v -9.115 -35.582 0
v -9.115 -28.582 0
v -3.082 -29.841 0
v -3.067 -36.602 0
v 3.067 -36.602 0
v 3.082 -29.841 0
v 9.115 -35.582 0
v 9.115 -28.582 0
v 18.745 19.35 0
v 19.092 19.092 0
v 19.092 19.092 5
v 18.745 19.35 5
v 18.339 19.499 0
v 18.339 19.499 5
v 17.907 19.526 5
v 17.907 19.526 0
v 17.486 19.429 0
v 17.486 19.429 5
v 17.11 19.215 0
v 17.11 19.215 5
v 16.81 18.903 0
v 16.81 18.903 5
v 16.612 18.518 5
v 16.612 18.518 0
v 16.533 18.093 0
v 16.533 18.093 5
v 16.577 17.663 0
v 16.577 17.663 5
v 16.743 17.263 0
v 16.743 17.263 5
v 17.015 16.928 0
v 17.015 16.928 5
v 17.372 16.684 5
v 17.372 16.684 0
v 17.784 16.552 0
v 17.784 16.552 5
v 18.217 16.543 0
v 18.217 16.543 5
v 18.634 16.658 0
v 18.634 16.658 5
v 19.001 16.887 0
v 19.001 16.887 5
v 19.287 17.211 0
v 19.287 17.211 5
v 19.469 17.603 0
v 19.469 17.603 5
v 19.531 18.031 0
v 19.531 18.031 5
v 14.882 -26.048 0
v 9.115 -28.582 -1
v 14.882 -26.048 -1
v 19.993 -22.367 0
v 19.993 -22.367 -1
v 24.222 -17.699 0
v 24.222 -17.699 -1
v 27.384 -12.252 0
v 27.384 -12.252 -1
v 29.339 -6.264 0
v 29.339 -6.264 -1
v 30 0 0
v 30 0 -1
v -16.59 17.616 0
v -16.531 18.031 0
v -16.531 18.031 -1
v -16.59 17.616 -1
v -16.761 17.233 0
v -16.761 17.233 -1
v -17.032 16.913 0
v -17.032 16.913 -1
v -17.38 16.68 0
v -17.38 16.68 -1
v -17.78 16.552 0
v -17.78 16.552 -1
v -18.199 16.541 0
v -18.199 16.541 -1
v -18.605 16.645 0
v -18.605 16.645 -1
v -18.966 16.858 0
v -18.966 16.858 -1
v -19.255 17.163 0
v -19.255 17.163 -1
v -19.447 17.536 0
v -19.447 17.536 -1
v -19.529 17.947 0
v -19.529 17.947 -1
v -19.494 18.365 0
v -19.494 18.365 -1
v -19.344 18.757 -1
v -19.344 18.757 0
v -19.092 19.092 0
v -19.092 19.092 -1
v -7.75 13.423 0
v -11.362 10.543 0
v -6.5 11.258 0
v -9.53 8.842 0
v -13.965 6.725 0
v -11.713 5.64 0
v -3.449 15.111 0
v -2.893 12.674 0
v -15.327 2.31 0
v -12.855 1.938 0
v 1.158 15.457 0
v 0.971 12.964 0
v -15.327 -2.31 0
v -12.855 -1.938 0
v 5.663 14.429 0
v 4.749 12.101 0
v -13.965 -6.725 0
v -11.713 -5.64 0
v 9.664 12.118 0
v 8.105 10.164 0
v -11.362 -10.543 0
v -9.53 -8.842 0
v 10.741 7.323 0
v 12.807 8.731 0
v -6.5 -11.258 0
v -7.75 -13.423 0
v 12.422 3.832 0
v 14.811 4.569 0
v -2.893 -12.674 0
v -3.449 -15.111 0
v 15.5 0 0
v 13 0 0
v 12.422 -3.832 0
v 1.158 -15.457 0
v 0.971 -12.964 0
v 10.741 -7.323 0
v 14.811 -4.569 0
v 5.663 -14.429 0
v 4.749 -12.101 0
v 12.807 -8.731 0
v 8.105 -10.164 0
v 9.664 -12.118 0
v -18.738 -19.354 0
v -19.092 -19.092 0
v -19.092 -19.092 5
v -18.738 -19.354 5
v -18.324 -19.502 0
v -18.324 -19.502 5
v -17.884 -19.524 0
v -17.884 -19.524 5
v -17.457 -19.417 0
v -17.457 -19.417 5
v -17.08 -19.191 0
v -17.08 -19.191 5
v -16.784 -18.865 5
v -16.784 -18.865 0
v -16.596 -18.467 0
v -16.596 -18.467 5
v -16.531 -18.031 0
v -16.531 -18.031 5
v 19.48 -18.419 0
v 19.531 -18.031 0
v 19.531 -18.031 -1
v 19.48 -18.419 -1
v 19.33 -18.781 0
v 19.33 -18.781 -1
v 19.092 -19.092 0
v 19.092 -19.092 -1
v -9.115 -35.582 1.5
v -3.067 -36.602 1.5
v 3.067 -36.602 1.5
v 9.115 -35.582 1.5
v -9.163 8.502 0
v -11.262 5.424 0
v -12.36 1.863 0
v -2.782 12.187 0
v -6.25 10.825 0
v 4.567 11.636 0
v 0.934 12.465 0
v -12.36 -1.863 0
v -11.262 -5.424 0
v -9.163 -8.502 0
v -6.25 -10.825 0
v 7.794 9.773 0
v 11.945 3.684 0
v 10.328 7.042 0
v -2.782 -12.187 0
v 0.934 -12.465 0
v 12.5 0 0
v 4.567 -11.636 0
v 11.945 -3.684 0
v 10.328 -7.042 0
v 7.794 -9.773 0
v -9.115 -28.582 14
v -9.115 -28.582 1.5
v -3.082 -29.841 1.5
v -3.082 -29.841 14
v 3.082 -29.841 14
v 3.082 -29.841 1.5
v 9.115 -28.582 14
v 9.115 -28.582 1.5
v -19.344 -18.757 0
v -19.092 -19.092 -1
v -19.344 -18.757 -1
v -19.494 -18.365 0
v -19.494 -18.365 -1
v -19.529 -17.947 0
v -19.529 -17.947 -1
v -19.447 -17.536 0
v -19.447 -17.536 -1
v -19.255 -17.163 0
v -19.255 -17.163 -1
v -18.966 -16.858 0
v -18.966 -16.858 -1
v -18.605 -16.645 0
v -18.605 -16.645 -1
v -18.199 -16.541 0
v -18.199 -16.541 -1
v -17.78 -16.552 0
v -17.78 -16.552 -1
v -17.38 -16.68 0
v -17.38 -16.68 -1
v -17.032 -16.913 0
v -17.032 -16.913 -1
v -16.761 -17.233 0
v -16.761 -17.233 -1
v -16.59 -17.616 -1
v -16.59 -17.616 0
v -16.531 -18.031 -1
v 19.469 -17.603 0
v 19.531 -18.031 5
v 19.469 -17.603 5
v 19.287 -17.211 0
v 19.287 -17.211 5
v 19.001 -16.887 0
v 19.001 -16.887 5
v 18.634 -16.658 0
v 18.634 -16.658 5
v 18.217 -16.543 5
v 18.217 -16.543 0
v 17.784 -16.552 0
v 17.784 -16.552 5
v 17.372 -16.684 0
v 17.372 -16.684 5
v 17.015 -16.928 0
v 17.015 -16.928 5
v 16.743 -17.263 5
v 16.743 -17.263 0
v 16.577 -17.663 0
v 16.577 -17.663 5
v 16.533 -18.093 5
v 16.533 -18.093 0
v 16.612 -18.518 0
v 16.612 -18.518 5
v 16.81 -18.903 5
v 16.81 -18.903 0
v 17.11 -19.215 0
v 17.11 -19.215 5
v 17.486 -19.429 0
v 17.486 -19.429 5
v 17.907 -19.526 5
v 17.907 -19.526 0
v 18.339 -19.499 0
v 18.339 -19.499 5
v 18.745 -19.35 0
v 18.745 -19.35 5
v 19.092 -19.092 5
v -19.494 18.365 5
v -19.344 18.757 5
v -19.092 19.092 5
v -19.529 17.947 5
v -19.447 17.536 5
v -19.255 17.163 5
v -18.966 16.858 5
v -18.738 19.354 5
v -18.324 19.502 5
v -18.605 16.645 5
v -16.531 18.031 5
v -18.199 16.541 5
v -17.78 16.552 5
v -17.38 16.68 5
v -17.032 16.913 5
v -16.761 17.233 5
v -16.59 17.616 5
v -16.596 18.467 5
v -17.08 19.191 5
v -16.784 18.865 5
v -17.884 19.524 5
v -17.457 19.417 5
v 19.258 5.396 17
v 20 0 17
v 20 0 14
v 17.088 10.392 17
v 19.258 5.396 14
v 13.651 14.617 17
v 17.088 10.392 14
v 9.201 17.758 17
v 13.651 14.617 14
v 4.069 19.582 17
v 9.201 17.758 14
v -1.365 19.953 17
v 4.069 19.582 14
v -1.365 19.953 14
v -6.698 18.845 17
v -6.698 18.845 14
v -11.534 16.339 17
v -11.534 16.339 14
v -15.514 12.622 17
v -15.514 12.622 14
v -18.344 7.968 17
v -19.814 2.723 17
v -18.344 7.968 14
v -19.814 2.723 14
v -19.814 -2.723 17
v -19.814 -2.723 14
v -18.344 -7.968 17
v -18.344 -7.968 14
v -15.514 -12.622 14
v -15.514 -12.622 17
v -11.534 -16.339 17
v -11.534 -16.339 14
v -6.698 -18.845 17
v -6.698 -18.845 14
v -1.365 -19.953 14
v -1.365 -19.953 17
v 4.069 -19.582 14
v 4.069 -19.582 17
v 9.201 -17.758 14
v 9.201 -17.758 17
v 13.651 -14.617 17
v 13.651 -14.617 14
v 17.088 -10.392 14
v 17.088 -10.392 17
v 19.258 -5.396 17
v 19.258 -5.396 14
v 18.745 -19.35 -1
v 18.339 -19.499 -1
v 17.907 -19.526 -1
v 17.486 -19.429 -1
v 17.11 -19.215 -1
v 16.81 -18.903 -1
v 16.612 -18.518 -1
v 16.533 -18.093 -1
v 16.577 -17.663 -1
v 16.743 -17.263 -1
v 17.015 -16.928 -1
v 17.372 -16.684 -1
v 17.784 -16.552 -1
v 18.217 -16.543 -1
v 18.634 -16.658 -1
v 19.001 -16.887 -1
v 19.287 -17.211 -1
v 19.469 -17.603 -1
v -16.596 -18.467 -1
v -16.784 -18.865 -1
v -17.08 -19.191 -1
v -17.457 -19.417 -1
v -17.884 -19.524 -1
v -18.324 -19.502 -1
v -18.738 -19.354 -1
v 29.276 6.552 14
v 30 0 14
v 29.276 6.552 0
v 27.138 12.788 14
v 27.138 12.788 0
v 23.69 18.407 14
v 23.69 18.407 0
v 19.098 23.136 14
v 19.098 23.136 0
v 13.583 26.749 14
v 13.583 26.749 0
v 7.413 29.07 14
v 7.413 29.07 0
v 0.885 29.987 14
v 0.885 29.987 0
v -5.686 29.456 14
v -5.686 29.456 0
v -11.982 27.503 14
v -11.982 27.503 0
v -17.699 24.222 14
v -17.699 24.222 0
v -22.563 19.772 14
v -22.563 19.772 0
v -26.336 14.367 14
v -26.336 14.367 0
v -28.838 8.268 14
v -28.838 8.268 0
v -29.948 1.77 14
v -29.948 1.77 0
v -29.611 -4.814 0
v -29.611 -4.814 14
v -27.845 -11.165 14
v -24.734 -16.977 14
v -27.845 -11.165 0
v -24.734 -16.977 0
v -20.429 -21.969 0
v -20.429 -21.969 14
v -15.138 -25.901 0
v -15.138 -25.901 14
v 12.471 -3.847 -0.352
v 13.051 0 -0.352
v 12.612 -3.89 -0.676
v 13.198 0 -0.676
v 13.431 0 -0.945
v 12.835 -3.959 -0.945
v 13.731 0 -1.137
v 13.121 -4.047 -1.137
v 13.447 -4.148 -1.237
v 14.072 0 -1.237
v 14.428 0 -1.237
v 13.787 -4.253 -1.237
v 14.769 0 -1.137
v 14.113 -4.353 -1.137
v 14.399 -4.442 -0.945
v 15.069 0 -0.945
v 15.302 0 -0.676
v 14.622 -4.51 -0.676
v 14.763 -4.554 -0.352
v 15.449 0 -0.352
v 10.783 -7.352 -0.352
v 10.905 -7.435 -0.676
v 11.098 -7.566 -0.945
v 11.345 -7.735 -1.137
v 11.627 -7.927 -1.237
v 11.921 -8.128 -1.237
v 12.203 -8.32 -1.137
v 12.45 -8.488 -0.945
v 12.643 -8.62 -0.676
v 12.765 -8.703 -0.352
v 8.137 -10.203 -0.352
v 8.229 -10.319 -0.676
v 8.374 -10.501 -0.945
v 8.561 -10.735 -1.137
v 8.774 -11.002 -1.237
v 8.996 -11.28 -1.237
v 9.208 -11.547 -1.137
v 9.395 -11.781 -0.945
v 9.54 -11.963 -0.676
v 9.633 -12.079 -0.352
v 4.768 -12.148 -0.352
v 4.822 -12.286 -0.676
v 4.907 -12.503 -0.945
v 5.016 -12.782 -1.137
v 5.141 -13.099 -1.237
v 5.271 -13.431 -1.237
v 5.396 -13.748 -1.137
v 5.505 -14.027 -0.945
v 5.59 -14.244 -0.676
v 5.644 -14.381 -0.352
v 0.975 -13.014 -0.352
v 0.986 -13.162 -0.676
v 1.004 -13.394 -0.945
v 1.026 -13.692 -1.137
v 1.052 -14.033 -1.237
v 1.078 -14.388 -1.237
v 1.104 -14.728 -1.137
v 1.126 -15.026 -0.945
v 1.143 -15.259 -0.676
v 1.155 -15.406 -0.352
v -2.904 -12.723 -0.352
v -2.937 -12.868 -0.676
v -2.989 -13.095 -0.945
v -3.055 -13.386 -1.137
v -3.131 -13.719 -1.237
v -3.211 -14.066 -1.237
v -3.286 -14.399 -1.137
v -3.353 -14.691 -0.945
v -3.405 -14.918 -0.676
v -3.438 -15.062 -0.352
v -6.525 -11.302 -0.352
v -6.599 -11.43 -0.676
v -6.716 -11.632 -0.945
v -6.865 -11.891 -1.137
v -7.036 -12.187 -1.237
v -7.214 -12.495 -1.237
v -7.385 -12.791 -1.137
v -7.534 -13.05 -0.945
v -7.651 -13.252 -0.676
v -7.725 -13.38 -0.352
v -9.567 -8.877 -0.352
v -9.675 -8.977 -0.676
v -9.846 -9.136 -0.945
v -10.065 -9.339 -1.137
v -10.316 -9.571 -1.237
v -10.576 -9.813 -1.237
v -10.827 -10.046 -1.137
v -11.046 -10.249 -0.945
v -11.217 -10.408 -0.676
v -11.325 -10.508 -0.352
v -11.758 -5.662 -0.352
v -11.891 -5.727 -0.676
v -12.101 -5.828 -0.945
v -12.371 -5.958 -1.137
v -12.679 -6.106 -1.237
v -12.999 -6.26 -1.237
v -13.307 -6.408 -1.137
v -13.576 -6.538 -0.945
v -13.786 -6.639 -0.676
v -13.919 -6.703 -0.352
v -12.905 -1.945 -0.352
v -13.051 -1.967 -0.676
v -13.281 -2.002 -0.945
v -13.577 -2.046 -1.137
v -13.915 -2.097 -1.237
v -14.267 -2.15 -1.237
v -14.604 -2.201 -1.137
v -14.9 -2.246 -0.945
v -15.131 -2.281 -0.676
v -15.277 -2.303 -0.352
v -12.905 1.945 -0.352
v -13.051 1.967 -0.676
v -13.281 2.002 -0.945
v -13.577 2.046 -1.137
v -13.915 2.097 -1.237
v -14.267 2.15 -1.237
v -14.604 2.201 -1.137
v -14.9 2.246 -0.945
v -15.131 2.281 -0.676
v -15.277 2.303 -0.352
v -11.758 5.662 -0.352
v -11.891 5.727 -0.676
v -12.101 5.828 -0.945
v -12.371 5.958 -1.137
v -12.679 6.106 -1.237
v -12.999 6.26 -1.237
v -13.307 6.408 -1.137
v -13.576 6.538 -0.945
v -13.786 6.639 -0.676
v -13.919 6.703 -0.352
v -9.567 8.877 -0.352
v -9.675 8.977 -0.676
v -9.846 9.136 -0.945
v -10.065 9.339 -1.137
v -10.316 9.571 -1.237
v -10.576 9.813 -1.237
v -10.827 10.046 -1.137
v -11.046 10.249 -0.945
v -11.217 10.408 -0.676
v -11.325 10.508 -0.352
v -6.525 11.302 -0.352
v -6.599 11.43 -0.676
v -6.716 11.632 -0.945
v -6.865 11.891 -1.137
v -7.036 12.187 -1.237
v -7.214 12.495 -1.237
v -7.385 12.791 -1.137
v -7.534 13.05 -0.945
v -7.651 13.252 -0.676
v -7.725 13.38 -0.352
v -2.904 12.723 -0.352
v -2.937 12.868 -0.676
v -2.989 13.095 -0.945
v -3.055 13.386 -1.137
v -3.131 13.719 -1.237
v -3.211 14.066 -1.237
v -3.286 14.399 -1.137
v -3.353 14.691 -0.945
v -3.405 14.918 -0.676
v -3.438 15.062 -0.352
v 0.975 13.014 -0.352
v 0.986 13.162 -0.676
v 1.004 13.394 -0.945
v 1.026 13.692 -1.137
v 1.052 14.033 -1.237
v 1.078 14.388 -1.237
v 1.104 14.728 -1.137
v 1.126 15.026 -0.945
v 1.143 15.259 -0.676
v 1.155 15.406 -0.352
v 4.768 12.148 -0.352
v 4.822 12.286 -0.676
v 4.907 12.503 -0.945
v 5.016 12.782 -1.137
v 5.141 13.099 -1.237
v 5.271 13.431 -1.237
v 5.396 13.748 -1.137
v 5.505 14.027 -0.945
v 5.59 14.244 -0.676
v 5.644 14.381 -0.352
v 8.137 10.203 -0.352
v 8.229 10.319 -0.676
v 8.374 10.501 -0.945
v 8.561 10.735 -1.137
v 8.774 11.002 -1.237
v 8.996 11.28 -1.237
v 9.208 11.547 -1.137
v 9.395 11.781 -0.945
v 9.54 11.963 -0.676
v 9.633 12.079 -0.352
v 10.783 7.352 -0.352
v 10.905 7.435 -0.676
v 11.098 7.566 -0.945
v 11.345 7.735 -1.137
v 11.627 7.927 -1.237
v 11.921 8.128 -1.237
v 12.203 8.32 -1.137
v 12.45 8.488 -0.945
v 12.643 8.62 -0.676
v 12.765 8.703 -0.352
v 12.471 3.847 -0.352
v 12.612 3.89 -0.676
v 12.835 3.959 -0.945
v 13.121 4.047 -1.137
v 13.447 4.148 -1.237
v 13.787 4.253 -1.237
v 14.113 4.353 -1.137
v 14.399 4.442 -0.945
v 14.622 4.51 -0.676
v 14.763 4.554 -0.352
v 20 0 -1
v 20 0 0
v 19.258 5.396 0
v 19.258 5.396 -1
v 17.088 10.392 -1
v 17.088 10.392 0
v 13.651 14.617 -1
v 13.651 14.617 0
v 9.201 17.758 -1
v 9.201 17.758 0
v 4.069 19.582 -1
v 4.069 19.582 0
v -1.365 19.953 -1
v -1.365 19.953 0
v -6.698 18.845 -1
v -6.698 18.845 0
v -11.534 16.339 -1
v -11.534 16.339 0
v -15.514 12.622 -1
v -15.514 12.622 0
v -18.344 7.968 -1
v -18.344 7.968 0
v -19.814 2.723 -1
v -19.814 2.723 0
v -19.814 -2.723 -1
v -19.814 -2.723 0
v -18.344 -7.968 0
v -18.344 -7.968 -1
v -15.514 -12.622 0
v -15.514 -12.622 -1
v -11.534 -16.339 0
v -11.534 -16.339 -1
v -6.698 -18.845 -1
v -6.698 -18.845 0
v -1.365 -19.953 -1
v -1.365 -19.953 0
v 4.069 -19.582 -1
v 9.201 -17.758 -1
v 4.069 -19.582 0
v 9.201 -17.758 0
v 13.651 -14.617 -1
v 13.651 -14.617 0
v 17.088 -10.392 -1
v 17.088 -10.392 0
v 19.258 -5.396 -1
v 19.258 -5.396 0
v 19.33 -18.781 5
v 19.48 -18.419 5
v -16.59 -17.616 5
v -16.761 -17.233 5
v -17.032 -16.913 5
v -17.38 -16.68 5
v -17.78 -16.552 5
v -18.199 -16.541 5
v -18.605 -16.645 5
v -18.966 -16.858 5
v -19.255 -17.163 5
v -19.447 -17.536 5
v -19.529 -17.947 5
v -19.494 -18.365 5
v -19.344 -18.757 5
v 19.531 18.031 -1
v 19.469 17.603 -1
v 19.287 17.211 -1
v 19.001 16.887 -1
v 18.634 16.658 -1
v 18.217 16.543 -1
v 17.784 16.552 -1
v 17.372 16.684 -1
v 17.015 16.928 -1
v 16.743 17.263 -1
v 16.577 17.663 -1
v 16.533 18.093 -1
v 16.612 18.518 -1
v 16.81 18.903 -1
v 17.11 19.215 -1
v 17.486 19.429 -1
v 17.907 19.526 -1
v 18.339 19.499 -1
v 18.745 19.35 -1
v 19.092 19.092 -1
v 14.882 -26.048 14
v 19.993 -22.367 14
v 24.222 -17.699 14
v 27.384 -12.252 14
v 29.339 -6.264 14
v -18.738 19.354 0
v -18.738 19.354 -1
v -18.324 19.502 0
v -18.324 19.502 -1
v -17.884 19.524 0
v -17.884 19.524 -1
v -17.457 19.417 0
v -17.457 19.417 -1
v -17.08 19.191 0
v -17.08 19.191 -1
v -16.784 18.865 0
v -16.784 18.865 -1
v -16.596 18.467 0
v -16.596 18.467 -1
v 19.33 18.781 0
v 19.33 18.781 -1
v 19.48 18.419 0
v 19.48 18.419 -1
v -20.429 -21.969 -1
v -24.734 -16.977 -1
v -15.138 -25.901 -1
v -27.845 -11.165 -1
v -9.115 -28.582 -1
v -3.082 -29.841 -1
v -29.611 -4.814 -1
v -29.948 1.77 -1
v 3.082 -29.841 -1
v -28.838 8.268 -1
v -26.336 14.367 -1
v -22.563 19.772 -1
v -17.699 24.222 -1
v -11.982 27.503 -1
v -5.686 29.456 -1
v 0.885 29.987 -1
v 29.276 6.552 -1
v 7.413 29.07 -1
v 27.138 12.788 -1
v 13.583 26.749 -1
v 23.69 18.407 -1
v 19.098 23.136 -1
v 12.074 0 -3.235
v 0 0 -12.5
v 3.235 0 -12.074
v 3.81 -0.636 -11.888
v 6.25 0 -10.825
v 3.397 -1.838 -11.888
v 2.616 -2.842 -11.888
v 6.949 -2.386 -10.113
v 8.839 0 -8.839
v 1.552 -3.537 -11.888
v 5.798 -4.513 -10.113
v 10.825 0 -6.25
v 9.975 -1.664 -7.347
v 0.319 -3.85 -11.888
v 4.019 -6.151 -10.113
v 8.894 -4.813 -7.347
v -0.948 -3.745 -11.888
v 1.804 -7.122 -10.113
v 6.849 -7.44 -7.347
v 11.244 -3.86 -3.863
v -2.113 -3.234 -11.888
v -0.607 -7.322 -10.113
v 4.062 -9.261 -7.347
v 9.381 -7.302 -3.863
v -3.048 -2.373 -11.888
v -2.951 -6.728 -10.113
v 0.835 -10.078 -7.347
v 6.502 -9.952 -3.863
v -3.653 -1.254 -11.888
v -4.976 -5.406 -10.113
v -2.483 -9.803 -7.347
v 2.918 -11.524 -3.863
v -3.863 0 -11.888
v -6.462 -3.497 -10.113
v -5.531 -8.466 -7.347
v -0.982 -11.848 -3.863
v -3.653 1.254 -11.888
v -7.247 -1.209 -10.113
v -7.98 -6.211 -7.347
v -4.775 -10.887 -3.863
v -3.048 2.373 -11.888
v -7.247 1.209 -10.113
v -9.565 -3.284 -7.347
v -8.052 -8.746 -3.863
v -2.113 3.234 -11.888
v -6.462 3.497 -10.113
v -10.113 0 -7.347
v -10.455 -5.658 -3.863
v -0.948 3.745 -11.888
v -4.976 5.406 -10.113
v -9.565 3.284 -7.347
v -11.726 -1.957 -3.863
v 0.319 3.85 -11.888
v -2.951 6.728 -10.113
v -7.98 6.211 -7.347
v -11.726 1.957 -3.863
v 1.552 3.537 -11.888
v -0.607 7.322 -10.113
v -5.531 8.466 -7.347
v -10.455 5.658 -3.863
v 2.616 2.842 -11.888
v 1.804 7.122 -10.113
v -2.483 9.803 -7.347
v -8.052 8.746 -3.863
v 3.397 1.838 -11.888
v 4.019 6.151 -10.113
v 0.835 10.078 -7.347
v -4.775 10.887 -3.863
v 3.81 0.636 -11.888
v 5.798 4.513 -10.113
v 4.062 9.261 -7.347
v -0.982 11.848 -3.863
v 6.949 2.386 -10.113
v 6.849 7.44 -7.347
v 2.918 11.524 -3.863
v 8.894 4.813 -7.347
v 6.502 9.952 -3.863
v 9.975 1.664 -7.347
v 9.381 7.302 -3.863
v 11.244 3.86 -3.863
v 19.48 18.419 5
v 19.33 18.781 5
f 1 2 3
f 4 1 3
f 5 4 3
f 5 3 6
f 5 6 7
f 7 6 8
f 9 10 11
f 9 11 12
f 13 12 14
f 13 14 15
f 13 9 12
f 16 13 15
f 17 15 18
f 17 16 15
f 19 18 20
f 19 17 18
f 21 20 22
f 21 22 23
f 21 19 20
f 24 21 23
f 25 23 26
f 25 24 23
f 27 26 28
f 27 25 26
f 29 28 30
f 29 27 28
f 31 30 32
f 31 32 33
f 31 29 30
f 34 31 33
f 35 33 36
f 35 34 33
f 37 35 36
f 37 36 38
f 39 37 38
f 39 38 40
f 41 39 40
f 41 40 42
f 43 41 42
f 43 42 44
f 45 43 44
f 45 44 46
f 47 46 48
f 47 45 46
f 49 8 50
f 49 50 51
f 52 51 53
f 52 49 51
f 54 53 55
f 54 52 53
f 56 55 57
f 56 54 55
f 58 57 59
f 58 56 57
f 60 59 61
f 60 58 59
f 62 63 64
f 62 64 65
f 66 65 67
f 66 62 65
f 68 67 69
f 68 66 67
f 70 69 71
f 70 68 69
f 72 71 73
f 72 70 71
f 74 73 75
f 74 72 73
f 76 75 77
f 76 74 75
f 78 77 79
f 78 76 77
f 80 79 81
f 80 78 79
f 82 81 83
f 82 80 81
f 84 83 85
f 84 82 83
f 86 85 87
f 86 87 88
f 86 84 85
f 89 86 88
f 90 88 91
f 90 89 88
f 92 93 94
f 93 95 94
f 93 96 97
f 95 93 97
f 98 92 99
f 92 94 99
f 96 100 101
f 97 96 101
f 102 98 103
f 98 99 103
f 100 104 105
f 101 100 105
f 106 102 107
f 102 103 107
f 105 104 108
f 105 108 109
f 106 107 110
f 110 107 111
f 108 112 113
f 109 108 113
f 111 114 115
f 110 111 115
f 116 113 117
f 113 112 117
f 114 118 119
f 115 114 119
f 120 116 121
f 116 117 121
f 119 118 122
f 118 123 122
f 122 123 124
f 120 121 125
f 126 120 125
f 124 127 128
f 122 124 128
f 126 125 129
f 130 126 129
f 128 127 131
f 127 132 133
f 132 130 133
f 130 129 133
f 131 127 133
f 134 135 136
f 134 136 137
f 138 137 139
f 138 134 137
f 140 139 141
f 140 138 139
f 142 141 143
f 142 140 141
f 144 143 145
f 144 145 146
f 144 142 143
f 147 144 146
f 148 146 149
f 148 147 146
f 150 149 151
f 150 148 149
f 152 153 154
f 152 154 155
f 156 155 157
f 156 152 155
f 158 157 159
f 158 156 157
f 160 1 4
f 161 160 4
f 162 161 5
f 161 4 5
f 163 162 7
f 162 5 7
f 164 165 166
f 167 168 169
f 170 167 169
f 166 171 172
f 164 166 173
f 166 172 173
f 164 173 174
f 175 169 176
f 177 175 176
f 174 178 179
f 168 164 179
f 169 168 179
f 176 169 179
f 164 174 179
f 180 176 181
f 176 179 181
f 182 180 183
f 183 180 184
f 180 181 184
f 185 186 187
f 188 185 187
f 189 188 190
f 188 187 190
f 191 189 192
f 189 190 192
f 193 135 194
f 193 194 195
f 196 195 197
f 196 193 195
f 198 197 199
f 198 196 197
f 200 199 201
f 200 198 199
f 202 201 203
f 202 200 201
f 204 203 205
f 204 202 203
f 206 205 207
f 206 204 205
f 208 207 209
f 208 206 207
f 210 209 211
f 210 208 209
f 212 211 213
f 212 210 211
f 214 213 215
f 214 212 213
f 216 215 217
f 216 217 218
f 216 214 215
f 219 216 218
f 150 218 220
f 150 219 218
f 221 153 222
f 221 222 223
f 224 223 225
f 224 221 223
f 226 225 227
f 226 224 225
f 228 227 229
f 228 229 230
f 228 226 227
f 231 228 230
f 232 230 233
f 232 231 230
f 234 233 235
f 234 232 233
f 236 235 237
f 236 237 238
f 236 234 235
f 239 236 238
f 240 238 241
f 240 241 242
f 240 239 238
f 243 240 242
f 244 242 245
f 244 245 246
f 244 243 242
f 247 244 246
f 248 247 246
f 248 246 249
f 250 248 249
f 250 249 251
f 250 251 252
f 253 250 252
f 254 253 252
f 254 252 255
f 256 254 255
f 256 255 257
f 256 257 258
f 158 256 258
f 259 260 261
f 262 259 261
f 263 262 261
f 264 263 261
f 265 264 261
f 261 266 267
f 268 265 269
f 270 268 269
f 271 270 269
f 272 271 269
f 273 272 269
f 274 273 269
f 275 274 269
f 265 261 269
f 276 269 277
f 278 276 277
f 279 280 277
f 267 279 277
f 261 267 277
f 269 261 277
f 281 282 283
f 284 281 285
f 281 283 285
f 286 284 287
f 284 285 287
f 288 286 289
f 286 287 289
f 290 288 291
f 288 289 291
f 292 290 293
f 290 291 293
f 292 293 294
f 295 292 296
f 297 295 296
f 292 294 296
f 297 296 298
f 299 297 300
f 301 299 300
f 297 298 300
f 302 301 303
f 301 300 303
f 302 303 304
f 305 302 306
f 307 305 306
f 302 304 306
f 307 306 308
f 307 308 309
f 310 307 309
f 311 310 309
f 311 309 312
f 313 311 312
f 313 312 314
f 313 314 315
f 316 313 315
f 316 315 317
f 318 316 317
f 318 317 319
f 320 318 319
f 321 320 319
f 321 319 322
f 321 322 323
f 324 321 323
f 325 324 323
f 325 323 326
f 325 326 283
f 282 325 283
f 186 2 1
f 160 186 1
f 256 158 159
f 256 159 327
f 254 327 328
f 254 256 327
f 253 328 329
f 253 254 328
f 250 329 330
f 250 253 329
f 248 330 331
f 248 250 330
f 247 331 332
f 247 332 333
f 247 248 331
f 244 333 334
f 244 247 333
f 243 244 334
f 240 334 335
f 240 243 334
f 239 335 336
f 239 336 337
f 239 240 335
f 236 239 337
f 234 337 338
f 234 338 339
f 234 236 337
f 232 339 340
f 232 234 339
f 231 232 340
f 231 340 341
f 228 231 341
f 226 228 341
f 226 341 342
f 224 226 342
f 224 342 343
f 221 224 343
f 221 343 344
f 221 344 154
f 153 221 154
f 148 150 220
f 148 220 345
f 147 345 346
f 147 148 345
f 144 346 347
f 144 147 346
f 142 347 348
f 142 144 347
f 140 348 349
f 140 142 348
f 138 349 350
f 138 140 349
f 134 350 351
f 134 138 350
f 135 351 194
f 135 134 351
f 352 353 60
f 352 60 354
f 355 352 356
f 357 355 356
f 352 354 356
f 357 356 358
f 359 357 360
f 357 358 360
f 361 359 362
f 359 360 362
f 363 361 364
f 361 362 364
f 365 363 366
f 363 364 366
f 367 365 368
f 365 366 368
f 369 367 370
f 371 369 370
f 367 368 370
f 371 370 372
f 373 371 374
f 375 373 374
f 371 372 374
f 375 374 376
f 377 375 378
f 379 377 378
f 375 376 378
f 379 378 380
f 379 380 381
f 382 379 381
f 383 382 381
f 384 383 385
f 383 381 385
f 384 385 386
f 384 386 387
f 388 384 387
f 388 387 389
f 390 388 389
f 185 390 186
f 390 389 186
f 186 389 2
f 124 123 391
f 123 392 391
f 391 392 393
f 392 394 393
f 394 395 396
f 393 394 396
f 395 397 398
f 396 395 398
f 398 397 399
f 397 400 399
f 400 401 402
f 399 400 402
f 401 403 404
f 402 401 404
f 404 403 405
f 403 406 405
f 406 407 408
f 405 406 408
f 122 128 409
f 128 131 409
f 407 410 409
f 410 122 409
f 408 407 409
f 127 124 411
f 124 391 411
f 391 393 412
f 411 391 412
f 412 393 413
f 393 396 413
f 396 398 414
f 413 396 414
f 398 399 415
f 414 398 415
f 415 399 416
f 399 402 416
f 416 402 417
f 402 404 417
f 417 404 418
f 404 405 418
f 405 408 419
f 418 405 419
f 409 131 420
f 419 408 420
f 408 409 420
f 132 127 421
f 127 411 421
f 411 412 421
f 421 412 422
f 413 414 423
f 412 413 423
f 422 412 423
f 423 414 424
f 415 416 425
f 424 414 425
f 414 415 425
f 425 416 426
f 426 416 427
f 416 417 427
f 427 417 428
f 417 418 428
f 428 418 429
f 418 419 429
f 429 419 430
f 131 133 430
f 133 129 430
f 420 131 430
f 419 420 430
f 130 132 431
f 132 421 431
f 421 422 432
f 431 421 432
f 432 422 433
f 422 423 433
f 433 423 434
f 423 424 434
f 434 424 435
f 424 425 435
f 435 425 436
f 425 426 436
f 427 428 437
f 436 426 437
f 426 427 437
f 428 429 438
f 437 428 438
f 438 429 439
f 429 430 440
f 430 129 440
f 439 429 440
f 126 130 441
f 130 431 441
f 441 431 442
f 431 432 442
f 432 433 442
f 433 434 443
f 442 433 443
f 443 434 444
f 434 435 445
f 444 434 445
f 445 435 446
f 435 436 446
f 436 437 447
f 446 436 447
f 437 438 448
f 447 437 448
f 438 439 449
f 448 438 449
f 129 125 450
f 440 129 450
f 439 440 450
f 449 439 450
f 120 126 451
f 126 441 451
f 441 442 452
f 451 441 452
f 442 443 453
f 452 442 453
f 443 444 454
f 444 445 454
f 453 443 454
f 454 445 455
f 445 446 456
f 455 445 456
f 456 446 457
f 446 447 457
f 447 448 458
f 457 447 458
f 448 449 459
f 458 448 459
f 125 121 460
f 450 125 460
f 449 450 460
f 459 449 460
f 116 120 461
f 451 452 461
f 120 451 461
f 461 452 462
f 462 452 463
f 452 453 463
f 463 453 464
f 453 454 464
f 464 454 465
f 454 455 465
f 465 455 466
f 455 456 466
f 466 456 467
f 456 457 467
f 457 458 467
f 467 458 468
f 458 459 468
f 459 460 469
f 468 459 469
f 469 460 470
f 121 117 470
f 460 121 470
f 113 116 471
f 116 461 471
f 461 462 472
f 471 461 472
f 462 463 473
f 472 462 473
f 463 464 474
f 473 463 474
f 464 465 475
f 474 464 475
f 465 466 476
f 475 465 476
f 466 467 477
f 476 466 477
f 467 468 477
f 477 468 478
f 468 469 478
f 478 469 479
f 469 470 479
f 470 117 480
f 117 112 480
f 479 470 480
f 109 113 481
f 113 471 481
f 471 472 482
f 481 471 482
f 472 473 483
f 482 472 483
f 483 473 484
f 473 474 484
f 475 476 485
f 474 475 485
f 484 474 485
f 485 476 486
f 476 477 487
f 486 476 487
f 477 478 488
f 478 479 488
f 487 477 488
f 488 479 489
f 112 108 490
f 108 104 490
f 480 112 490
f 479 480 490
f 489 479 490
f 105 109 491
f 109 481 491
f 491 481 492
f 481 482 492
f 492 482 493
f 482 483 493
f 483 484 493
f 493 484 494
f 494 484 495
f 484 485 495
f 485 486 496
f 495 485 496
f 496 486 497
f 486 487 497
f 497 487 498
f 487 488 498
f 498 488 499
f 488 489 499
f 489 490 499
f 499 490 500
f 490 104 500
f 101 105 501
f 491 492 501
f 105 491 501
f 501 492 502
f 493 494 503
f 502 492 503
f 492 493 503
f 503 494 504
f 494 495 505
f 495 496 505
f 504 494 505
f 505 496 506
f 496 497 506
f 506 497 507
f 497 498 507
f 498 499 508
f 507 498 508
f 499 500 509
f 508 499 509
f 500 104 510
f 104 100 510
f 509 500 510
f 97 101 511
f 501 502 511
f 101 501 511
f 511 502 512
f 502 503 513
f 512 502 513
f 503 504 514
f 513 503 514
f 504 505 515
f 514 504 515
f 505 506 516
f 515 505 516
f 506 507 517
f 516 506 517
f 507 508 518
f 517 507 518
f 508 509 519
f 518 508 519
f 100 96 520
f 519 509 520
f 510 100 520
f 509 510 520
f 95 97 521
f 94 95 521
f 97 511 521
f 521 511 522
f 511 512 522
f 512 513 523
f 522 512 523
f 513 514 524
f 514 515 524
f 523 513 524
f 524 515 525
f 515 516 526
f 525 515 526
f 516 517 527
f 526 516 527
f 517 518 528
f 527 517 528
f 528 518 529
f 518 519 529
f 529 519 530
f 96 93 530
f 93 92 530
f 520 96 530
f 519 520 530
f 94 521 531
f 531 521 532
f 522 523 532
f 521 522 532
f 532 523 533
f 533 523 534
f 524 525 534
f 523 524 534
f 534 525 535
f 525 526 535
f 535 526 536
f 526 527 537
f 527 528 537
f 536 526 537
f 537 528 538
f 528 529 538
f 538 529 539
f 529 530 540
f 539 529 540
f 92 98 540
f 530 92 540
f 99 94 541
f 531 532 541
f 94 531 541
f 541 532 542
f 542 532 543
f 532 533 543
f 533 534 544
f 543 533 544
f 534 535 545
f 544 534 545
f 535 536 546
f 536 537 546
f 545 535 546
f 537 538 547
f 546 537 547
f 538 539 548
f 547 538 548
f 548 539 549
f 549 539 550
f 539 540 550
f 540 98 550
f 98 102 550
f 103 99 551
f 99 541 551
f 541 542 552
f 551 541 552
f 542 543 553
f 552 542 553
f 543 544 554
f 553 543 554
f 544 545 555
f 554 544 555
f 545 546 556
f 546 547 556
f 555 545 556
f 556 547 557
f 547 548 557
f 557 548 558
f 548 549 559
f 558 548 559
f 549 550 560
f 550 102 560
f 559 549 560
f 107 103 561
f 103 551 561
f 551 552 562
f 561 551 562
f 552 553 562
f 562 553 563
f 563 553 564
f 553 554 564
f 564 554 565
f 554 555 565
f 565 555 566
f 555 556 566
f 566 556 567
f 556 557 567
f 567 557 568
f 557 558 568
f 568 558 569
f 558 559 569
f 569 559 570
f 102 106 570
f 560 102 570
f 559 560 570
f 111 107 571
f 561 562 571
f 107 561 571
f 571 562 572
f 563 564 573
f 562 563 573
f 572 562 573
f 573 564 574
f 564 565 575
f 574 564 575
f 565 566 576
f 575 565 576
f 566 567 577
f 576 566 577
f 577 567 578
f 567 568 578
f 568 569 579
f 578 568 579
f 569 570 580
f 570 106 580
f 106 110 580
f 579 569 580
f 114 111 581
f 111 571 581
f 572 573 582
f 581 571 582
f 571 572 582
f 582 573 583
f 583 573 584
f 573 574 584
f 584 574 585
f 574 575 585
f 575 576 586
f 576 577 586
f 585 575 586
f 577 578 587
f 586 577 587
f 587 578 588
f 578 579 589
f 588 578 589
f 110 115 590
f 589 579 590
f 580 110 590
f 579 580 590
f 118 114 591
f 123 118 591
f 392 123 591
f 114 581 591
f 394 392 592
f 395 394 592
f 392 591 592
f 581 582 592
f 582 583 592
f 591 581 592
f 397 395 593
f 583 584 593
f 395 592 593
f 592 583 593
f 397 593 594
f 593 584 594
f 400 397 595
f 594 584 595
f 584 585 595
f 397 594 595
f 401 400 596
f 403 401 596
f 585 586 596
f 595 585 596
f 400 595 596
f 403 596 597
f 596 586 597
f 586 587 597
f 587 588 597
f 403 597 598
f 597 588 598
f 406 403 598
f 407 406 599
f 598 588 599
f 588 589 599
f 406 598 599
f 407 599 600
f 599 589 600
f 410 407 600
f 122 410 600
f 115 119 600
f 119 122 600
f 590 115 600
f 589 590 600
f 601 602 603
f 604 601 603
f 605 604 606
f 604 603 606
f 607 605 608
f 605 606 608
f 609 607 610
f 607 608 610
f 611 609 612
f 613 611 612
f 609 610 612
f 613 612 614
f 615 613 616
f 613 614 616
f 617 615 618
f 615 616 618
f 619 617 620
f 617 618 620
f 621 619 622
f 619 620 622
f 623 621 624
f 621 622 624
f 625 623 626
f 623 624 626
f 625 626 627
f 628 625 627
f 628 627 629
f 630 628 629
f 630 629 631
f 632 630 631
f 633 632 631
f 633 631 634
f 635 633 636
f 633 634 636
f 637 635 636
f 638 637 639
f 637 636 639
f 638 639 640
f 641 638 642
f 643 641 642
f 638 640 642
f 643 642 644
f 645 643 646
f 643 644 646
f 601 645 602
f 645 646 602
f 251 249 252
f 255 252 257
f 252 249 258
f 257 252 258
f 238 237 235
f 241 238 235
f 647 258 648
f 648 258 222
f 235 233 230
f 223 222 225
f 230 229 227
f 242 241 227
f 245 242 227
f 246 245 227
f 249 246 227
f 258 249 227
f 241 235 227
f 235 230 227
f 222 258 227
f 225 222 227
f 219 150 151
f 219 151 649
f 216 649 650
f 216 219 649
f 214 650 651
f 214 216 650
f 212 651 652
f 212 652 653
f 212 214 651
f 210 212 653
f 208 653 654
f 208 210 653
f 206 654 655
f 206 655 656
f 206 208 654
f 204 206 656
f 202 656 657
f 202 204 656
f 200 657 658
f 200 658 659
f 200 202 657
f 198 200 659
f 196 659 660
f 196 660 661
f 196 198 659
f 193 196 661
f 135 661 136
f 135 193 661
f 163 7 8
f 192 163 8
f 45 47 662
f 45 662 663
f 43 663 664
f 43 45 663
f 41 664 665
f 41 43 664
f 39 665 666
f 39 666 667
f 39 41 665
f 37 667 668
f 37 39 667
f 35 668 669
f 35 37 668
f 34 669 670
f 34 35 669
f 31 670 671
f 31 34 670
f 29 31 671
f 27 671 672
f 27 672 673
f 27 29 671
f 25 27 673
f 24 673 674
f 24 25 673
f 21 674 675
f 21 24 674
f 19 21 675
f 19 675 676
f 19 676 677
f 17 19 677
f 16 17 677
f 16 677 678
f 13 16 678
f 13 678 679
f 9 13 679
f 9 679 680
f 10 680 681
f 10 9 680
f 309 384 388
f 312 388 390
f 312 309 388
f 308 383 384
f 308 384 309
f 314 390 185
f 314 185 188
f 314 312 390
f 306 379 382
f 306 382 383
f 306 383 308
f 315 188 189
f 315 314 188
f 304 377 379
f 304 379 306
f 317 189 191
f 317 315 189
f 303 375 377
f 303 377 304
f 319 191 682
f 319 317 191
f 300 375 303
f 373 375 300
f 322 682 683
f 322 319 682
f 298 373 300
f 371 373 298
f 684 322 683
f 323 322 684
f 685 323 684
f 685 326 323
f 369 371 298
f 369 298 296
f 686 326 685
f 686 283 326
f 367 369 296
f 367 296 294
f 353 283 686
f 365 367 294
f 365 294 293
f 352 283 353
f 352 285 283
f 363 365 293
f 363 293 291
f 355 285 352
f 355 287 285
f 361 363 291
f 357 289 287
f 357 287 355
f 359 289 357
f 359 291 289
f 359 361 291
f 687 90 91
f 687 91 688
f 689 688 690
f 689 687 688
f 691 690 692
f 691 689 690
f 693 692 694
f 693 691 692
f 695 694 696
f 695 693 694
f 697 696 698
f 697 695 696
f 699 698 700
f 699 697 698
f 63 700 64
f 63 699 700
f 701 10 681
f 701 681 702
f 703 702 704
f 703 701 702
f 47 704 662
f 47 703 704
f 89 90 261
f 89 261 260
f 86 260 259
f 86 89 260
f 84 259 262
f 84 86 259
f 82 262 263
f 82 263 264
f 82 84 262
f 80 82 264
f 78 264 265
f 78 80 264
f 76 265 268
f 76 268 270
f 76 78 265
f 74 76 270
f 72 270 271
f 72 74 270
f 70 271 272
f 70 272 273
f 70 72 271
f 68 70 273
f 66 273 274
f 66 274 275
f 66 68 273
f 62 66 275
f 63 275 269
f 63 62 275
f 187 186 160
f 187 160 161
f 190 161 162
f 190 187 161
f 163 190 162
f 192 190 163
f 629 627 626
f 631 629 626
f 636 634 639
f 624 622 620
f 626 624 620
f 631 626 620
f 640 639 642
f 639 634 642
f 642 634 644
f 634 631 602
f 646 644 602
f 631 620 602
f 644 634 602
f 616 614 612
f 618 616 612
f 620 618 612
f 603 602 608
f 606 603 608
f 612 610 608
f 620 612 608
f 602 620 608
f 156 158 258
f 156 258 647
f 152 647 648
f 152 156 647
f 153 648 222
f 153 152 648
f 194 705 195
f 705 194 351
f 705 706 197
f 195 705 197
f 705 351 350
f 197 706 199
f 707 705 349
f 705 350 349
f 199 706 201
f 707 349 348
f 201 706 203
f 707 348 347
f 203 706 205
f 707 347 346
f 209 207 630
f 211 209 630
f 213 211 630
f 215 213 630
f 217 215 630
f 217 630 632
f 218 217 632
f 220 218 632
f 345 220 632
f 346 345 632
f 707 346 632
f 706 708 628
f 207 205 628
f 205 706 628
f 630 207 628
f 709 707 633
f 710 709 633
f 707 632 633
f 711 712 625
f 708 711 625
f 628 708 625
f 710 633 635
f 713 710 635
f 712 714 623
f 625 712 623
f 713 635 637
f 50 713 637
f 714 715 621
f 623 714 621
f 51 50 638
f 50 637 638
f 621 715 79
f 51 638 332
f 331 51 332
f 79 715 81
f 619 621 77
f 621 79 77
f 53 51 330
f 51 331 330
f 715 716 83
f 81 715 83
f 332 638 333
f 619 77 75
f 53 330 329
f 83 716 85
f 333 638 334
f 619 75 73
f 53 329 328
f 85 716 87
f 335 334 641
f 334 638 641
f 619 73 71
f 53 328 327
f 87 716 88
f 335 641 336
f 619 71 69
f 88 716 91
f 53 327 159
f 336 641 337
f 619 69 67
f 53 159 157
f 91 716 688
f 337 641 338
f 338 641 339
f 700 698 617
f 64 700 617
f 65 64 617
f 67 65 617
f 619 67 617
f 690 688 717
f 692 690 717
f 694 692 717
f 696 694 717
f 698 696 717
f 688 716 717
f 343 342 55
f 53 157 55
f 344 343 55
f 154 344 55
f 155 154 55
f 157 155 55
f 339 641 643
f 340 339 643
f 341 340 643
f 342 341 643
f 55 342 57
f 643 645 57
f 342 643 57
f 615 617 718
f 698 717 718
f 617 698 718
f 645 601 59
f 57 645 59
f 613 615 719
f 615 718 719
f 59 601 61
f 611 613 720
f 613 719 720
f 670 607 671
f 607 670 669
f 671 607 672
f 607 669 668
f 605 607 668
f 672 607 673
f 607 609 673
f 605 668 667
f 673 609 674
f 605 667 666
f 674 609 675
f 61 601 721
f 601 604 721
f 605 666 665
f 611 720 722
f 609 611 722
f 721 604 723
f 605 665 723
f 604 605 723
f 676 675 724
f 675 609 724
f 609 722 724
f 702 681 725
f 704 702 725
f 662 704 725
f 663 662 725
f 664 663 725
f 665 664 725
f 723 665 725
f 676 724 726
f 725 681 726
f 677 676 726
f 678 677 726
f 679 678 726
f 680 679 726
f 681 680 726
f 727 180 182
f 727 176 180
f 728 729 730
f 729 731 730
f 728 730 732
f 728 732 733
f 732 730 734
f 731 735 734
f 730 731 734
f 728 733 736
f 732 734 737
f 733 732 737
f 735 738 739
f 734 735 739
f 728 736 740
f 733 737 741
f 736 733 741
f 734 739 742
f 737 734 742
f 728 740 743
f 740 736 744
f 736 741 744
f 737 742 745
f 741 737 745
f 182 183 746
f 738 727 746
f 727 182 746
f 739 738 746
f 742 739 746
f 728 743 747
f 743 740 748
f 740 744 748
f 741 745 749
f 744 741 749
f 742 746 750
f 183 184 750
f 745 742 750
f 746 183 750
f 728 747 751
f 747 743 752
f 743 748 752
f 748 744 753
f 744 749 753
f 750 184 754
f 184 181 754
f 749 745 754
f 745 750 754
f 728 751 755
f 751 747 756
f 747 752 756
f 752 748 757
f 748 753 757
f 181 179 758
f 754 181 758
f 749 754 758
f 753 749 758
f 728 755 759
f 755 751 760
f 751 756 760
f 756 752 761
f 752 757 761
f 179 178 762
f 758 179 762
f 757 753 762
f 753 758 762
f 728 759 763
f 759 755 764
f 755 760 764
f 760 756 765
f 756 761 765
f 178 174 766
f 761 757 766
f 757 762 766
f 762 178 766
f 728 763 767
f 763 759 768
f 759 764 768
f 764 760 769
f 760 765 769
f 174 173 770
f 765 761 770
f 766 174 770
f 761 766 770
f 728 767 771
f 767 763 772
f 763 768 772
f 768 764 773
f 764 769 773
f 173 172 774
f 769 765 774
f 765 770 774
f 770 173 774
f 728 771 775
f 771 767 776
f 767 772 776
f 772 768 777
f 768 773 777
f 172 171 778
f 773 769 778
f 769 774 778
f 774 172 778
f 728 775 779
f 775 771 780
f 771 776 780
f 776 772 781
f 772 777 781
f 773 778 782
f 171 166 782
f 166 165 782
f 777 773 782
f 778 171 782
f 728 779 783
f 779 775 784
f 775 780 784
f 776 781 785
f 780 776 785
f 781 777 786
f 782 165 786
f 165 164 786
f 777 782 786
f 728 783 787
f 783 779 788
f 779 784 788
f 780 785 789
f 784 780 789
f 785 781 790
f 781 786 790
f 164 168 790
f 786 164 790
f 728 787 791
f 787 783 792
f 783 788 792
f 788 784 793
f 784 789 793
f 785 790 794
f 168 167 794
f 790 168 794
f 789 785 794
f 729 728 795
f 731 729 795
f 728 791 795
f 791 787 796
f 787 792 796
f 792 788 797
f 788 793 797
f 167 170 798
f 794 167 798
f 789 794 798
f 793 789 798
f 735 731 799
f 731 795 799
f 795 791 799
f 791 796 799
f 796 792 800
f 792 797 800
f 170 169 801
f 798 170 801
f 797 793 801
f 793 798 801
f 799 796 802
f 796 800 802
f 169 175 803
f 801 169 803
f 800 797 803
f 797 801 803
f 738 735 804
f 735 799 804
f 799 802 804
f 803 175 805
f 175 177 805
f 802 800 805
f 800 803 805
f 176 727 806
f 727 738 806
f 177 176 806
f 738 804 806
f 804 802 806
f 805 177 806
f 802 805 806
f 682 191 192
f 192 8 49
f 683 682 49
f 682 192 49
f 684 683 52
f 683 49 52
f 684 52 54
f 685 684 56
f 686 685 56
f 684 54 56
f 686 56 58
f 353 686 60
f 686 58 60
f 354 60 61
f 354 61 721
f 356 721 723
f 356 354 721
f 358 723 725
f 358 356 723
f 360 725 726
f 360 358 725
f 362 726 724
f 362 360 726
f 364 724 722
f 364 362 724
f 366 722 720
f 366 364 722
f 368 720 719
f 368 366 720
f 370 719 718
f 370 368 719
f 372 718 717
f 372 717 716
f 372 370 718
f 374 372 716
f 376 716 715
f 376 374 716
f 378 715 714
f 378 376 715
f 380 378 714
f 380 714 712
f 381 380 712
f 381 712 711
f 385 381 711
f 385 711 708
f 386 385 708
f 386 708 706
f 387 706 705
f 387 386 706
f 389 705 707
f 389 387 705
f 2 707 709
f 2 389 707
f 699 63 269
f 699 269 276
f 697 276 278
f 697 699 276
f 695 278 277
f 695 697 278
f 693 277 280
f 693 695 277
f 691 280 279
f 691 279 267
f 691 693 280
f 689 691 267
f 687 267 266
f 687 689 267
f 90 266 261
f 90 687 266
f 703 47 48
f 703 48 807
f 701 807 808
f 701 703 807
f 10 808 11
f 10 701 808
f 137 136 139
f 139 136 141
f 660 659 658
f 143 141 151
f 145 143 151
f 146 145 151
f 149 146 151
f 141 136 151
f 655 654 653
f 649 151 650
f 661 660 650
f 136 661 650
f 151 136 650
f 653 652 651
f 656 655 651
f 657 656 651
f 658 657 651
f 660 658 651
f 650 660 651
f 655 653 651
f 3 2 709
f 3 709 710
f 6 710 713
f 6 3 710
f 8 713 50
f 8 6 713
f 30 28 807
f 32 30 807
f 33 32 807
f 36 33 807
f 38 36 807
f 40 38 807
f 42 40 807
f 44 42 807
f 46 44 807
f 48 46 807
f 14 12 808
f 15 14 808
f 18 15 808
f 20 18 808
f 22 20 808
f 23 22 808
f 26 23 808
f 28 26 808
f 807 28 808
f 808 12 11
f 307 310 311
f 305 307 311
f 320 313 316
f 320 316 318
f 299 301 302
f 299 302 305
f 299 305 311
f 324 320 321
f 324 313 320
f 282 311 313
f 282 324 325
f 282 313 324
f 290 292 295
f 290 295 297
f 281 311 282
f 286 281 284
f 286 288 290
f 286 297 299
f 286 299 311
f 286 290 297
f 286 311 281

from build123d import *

# Parameters (mm, degrees)
F0_R     = 20
F0_R_2   = 12.5
F1_DEPTH = 14
F2_DEPTH = 17
F0_R_3   = 1
F3_DEPTH = 1.5
F4_DEPTH = 5
F7_DEPTH = 1


with BuildPart() as f1:
    # F0 (on Top) → F1 (new body)
    with BuildSketch(Plane.XY):
        with BuildLine():
            ThreePointArc((9.1152584866, -28.5816735466), (24.2224870172, -17.6994667349), (30, 0))
            ThreePointArc((30, 0), (-17.6994667349, 24.2224870172), (-9.1152584866, -28.5816735466))
            ThreePointArc((-9.1152584866, -28.5816735466), (0, -30), (9.1152584866, -28.5816735466))
        make_face()
        with BuildLine():
            ThreePointArc((19.091883092, 19.091883092), (24.9447473778, 10.3324526739), (27, 0))
            ThreePointArc((27, 0), (24.9447473798, -10.3324526689), (19.0918830996, -19.0918830845))
            ThreePointArc((19.0918830996, -19.0918830845), (5.3e-09, -27), (-19.091883092, -19.091883092))
            ThreePointArc((-19.091883092, -19.091883092), (-27, 0), (-19.091883092, 19.091883092))
            ThreePointArc((-19.091883092, 19.091883092), (0, 27), (19.091883092, 19.091883092))
        make_face(mode=Mode.SUBTRACT)
        with BuildLine():
            ThreePointArc((19.0918830996, -19.0918830845), (24.9447473798, -10.3324526689), (27, 0))
            ThreePointArc((27, 0), (24.9447473778, 10.3324526739), (19.091883092, 19.091883092))
            ThreePointArc((19.091883092, 19.091883092), (0, 27), (-19.091883092, 19.091883092))
            ThreePointArc((-19.091883092, 19.091883092), (-27, 0), (-19.091883092, -19.091883092))
            ThreePointArc((-19.091883092, -19.091883092), (5.3e-09, -27), (19.0918830996, -19.0918830845))
        make_face()
        with BuildLine():
            ThreePointArc((-16.5312229203, -18.0312229203), (-17.4571977717, -19.417042219), (-19.091883092, -19.091883092))
            ThreePointArc((-19.091883092, -19.091883092), (-18.6052480688, -16.6454036215), (-16.5312229203, -18.0312229203))
        make_face(mode=Mode.SUBTRACT)
        with BuildLine():
            ThreePointArc((19.5312229203, -18.0312229203), (19.4170422211, -18.6052480639), (19.0918830996, -19.0918830845))
            ThreePointArc((19.0918830996, -19.0918830845), (16.6454036195, -17.4571977766), (19.5312229203, -18.0312229203))
        make_face(mode=Mode.SUBTRACT)
        with BuildLine():
            ThreePointArc((-16.5312229203, 18.0312229203), (-18.6052480688, 16.6454036215), (-19.091883092, 19.091883092))
            ThreePointArc((-19.091883092, 19.091883092), (-17.4571977717, 19.417042219), (-16.5312229203, 18.0312229203))
        make_face(mode=Mode.SUBTRACT)
        Circle(F0_R, mode=Mode.SUBTRACT)
        with BuildLine():
            ThreePointArc((19.5312229203, 18.0312229203), (16.6454036215, 17.4571977717), (19.091883092, 19.091883092))
            ThreePointArc((19.091883092, 19.091883092), (19.417042219, 18.6052480688), (19.5312229203, 18.0312229203))
        make_face(mode=Mode.SUBTRACT)
        Circle(F0_R)
        Circle(F0_R_2, mode=Mode.SUBTRACT)
        Circle(F0_R_2)
        with BuildLine():
            ThreePointArc((19.5312229203, 18.0312229203), (19.417042219, 18.6052480688), (19.091883092, 19.091883092))
            ThreePointArc((19.091883092, 19.091883092), (16.6454036215, 17.4571977717), (19.5312229203, 18.0312229203))
        make_face()
        with BuildLine():
            ThreePointArc((-16.5312229203, 18.0312229203), (-17.4571977717, 19.417042219), (-19.091883092, 19.091883092))
            ThreePointArc((-19.091883092, 19.091883092), (-18.6052480688, 16.6454036215), (-16.5312229203, 18.0312229203))
        make_face()
        with BuildLine():
            ThreePointArc((-16.5312229203, -18.0312229203), (-18.6052480688, -16.6454036215), (-19.091883092, -19.091883092))
            ThreePointArc((-19.091883092, -19.091883092), (-17.4571977717, -19.417042219), (-16.5312229203, -18.0312229203))
        make_face()
        with BuildLine():
            ThreePointArc((19.5312229203, -18.0312229203), (16.6454036195, -17.4571977766), (19.0918830996, -19.0918830845))
            ThreePointArc((19.0918830996, -19.0918830845), (19.4170422211, -18.6052480639), (19.5312229203, -18.0312229203))
        make_face()
    extrude(amount=F1_DEPTH)

    # F0 (on Top) → F2 (join)
    with BuildSketch(Plane.XY):
        Circle(F0_R)
        Circle(F0_R_2, mode=Mode.SUBTRACT)
        Circle(F0_R_2)
    extrude(amount=F2_DEPTH)

    # F0 (on Top) → F3 (join)
    with BuildSketch(Plane.XY):
        with BuildLine():
            ThreePointArc((9.1152584866, -28.5816735466), (0, -30), (-9.1152584866, -28.5816735466))
            Line((-9.1152584866, -28.5816735466), (-9.1152584866, -35.5816735466))
            ThreePointArc((-9.1152584866, -35.5816735466), (0, -36.7306878462), (9.1152584866, -35.5816735466))
            Line((9.1152584866, -35.5816735466), (9.1152584866, -28.5816735466))
        make_face()
        with Locations((-4.2370397167, -33.0812516278)):
            Circle(F0_R_3, mode=Mode.SUBTRACT)
        with Locations((4.2370397167, -33.0812516278)):
            Circle(F0_R_3, mode=Mode.SUBTRACT)
        with Locations((-4.2370397167, -33.0812516278)):
            Circle(F0_R_3)
        with Locations((4.2370397167, -33.0812516278)):
            Circle(F0_R_3)
    extrude(amount=F3_DEPTH)

    # F0 (on Top) → F4 (cut)
    with BuildSketch(Plane.XY):
        with BuildLine():
            ThreePointArc((-16.5312229203, 18.0312229203), (-17.4571977717, 19.417042219), (-19.091883092, 19.091883092))
            ThreePointArc((-19.091883092, 19.091883092), (-18.6052480688, 16.6454036215), (-16.5312229203, 18.0312229203))
        make_face()
        with BuildLine():
            ThreePointArc((19.5312229203, 18.0312229203), (19.417042219, 18.6052480688), (19.091883092, 19.091883092))
            ThreePointArc((19.091883092, 19.091883092), (16.6454036215, 17.4571977717), (19.5312229203, 18.0312229203))
        make_face()
        with BuildLine():
            ThreePointArc((19.5312229203, -18.0312229203), (16.6454036195, -17.4571977766), (19.0918830996, -19.0918830845))
            ThreePointArc((19.0918830996, -19.0918830845), (19.4170422211, -18.6052480639), (19.5312229203, -18.0312229203))
        make_face()
        with BuildLine():
            ThreePointArc((-16.5312229203, -18.0312229203), (-18.6052480688, -16.6454036215), (-19.091883092, -19.091883092))
            ThreePointArc((-19.091883092, -19.091883092), (-17.4571977717, -19.417042219), (-16.5312229203, -18.0312229203))
        make_face()
    extrude(amount=F4_DEPTH, mode=Mode.SUBTRACT)

    # F0 (on Top) → F7 (join)
    with BuildSketch(Plane.XY):
        with BuildLine():
            ThreePointArc((9.1152584866, -28.5816735466), (24.2224870172, -17.6994667349), (30, 0))
            ThreePointArc((30, 0), (-17.6994667349, 24.2224870172), (-9.1152584866, -28.5816735466))
            ThreePointArc((-9.1152584866, -28.5816735466), (0, -30), (9.1152584866, -28.5816735466))
        make_face()
        with BuildLine():
            ThreePointArc((19.091883092, 19.091883092), (24.9447473778, 10.3324526739), (27, 0))
            ThreePointArc((27, 0), (24.9447473798, -10.3324526689), (19.0918830996, -19.0918830845))
            ThreePointArc((19.0918830996, -19.0918830845), (5.3e-09, -27), (-19.091883092, -19.091883092))
            ThreePointArc((-19.091883092, -19.091883092), (-27, 0), (-19.091883092, 19.091883092))
            ThreePointArc((-19.091883092, 19.091883092), (0, 27), (19.091883092, 19.091883092))
        make_face(mode=Mode.SUBTRACT)
        with BuildLine():
            ThreePointArc((19.0918830996, -19.0918830845), (24.9447473798, -10.3324526689), (27, 0))
            ThreePointArc((27, 0), (24.9447473778, 10.3324526739), (19.091883092, 19.091883092))
            ThreePointArc((19.091883092, 19.091883092), (0, 27), (-19.091883092, 19.091883092))
            ThreePointArc((-19.091883092, 19.091883092), (-27, 0), (-19.091883092, -19.091883092))
            ThreePointArc((-19.091883092, -19.091883092), (5.3e-09, -27), (19.0918830996, -19.0918830845))
        make_face()
        with BuildLine():
            ThreePointArc((-16.5312229203, -18.0312229203), (-17.4571977717, -19.417042219), (-19.091883092, -19.091883092))
            ThreePointArc((-19.091883092, -19.091883092), (-18.6052480688, -16.6454036215), (-16.5312229203, -18.0312229203))
        make_face(mode=Mode.SUBTRACT)
        with BuildLine():
            ThreePointArc((19.5312229203, -18.0312229203), (19.4170422211, -18.6052480639), (19.0918830996, -19.0918830845))
            ThreePointArc((19.0918830996, -19.0918830845), (16.6454036195, -17.4571977766), (19.5312229203, -18.0312229203))
        make_face(mode=Mode.SUBTRACT)
        with BuildLine():
            ThreePointArc((-16.5312229203, 18.0312229203), (-18.6052480688, 16.6454036215), (-19.091883092, 19.091883092))
            ThreePointArc((-19.091883092, 19.091883092), (-17.4571977717, 19.417042219), (-16.5312229203, 18.0312229203))
        make_face(mode=Mode.SUBTRACT)
        Circle(F0_R, mode=Mode.SUBTRACT)
        with BuildLine():
            ThreePointArc((19.5312229203, 18.0312229203), (16.6454036215, 17.4571977717), (19.091883092, 19.091883092))
            ThreePointArc((19.091883092, 19.091883092), (19.417042219, 18.6052480688), (19.5312229203, 18.0312229203))
        make_face(mode=Mode.SUBTRACT)
    extrude(amount=-F7_DEPTH)


with BuildPart() as f6:
    # F5 (on Front) → F6 (revolve)
    with BuildSketch(Plane.XZ):
        with BuildLine():
            Line((12.5, 0), (0, 0))
            Line((0, 0), (0, -12.5))
            ThreePointArc((0, -12.5), (8.8388347648, -8.8388347648), (12.5, 0))
        make_face()
    revolve(axis=Axis((0, 0, -7.012763992), (0, 0, -1)))


with BuildPart() as f6b:
    # F5 (on Front) → F6, piece 2 (revolve)
    with BuildSketch(Plane.XZ):
        with BuildLine():
            Line((14.25, 0), (13, 0))
            ThreePointArc((13, 0), (14.25, -1.25), (15.5, 0))
            Line((15.5, 0), (14.25, 0))
        make_face()
    revolve(axis=Axis((0, 0, -7.012763992), (0, 0, -1)))


solid = Compound([f1.part, f6.part, f6b.part])
